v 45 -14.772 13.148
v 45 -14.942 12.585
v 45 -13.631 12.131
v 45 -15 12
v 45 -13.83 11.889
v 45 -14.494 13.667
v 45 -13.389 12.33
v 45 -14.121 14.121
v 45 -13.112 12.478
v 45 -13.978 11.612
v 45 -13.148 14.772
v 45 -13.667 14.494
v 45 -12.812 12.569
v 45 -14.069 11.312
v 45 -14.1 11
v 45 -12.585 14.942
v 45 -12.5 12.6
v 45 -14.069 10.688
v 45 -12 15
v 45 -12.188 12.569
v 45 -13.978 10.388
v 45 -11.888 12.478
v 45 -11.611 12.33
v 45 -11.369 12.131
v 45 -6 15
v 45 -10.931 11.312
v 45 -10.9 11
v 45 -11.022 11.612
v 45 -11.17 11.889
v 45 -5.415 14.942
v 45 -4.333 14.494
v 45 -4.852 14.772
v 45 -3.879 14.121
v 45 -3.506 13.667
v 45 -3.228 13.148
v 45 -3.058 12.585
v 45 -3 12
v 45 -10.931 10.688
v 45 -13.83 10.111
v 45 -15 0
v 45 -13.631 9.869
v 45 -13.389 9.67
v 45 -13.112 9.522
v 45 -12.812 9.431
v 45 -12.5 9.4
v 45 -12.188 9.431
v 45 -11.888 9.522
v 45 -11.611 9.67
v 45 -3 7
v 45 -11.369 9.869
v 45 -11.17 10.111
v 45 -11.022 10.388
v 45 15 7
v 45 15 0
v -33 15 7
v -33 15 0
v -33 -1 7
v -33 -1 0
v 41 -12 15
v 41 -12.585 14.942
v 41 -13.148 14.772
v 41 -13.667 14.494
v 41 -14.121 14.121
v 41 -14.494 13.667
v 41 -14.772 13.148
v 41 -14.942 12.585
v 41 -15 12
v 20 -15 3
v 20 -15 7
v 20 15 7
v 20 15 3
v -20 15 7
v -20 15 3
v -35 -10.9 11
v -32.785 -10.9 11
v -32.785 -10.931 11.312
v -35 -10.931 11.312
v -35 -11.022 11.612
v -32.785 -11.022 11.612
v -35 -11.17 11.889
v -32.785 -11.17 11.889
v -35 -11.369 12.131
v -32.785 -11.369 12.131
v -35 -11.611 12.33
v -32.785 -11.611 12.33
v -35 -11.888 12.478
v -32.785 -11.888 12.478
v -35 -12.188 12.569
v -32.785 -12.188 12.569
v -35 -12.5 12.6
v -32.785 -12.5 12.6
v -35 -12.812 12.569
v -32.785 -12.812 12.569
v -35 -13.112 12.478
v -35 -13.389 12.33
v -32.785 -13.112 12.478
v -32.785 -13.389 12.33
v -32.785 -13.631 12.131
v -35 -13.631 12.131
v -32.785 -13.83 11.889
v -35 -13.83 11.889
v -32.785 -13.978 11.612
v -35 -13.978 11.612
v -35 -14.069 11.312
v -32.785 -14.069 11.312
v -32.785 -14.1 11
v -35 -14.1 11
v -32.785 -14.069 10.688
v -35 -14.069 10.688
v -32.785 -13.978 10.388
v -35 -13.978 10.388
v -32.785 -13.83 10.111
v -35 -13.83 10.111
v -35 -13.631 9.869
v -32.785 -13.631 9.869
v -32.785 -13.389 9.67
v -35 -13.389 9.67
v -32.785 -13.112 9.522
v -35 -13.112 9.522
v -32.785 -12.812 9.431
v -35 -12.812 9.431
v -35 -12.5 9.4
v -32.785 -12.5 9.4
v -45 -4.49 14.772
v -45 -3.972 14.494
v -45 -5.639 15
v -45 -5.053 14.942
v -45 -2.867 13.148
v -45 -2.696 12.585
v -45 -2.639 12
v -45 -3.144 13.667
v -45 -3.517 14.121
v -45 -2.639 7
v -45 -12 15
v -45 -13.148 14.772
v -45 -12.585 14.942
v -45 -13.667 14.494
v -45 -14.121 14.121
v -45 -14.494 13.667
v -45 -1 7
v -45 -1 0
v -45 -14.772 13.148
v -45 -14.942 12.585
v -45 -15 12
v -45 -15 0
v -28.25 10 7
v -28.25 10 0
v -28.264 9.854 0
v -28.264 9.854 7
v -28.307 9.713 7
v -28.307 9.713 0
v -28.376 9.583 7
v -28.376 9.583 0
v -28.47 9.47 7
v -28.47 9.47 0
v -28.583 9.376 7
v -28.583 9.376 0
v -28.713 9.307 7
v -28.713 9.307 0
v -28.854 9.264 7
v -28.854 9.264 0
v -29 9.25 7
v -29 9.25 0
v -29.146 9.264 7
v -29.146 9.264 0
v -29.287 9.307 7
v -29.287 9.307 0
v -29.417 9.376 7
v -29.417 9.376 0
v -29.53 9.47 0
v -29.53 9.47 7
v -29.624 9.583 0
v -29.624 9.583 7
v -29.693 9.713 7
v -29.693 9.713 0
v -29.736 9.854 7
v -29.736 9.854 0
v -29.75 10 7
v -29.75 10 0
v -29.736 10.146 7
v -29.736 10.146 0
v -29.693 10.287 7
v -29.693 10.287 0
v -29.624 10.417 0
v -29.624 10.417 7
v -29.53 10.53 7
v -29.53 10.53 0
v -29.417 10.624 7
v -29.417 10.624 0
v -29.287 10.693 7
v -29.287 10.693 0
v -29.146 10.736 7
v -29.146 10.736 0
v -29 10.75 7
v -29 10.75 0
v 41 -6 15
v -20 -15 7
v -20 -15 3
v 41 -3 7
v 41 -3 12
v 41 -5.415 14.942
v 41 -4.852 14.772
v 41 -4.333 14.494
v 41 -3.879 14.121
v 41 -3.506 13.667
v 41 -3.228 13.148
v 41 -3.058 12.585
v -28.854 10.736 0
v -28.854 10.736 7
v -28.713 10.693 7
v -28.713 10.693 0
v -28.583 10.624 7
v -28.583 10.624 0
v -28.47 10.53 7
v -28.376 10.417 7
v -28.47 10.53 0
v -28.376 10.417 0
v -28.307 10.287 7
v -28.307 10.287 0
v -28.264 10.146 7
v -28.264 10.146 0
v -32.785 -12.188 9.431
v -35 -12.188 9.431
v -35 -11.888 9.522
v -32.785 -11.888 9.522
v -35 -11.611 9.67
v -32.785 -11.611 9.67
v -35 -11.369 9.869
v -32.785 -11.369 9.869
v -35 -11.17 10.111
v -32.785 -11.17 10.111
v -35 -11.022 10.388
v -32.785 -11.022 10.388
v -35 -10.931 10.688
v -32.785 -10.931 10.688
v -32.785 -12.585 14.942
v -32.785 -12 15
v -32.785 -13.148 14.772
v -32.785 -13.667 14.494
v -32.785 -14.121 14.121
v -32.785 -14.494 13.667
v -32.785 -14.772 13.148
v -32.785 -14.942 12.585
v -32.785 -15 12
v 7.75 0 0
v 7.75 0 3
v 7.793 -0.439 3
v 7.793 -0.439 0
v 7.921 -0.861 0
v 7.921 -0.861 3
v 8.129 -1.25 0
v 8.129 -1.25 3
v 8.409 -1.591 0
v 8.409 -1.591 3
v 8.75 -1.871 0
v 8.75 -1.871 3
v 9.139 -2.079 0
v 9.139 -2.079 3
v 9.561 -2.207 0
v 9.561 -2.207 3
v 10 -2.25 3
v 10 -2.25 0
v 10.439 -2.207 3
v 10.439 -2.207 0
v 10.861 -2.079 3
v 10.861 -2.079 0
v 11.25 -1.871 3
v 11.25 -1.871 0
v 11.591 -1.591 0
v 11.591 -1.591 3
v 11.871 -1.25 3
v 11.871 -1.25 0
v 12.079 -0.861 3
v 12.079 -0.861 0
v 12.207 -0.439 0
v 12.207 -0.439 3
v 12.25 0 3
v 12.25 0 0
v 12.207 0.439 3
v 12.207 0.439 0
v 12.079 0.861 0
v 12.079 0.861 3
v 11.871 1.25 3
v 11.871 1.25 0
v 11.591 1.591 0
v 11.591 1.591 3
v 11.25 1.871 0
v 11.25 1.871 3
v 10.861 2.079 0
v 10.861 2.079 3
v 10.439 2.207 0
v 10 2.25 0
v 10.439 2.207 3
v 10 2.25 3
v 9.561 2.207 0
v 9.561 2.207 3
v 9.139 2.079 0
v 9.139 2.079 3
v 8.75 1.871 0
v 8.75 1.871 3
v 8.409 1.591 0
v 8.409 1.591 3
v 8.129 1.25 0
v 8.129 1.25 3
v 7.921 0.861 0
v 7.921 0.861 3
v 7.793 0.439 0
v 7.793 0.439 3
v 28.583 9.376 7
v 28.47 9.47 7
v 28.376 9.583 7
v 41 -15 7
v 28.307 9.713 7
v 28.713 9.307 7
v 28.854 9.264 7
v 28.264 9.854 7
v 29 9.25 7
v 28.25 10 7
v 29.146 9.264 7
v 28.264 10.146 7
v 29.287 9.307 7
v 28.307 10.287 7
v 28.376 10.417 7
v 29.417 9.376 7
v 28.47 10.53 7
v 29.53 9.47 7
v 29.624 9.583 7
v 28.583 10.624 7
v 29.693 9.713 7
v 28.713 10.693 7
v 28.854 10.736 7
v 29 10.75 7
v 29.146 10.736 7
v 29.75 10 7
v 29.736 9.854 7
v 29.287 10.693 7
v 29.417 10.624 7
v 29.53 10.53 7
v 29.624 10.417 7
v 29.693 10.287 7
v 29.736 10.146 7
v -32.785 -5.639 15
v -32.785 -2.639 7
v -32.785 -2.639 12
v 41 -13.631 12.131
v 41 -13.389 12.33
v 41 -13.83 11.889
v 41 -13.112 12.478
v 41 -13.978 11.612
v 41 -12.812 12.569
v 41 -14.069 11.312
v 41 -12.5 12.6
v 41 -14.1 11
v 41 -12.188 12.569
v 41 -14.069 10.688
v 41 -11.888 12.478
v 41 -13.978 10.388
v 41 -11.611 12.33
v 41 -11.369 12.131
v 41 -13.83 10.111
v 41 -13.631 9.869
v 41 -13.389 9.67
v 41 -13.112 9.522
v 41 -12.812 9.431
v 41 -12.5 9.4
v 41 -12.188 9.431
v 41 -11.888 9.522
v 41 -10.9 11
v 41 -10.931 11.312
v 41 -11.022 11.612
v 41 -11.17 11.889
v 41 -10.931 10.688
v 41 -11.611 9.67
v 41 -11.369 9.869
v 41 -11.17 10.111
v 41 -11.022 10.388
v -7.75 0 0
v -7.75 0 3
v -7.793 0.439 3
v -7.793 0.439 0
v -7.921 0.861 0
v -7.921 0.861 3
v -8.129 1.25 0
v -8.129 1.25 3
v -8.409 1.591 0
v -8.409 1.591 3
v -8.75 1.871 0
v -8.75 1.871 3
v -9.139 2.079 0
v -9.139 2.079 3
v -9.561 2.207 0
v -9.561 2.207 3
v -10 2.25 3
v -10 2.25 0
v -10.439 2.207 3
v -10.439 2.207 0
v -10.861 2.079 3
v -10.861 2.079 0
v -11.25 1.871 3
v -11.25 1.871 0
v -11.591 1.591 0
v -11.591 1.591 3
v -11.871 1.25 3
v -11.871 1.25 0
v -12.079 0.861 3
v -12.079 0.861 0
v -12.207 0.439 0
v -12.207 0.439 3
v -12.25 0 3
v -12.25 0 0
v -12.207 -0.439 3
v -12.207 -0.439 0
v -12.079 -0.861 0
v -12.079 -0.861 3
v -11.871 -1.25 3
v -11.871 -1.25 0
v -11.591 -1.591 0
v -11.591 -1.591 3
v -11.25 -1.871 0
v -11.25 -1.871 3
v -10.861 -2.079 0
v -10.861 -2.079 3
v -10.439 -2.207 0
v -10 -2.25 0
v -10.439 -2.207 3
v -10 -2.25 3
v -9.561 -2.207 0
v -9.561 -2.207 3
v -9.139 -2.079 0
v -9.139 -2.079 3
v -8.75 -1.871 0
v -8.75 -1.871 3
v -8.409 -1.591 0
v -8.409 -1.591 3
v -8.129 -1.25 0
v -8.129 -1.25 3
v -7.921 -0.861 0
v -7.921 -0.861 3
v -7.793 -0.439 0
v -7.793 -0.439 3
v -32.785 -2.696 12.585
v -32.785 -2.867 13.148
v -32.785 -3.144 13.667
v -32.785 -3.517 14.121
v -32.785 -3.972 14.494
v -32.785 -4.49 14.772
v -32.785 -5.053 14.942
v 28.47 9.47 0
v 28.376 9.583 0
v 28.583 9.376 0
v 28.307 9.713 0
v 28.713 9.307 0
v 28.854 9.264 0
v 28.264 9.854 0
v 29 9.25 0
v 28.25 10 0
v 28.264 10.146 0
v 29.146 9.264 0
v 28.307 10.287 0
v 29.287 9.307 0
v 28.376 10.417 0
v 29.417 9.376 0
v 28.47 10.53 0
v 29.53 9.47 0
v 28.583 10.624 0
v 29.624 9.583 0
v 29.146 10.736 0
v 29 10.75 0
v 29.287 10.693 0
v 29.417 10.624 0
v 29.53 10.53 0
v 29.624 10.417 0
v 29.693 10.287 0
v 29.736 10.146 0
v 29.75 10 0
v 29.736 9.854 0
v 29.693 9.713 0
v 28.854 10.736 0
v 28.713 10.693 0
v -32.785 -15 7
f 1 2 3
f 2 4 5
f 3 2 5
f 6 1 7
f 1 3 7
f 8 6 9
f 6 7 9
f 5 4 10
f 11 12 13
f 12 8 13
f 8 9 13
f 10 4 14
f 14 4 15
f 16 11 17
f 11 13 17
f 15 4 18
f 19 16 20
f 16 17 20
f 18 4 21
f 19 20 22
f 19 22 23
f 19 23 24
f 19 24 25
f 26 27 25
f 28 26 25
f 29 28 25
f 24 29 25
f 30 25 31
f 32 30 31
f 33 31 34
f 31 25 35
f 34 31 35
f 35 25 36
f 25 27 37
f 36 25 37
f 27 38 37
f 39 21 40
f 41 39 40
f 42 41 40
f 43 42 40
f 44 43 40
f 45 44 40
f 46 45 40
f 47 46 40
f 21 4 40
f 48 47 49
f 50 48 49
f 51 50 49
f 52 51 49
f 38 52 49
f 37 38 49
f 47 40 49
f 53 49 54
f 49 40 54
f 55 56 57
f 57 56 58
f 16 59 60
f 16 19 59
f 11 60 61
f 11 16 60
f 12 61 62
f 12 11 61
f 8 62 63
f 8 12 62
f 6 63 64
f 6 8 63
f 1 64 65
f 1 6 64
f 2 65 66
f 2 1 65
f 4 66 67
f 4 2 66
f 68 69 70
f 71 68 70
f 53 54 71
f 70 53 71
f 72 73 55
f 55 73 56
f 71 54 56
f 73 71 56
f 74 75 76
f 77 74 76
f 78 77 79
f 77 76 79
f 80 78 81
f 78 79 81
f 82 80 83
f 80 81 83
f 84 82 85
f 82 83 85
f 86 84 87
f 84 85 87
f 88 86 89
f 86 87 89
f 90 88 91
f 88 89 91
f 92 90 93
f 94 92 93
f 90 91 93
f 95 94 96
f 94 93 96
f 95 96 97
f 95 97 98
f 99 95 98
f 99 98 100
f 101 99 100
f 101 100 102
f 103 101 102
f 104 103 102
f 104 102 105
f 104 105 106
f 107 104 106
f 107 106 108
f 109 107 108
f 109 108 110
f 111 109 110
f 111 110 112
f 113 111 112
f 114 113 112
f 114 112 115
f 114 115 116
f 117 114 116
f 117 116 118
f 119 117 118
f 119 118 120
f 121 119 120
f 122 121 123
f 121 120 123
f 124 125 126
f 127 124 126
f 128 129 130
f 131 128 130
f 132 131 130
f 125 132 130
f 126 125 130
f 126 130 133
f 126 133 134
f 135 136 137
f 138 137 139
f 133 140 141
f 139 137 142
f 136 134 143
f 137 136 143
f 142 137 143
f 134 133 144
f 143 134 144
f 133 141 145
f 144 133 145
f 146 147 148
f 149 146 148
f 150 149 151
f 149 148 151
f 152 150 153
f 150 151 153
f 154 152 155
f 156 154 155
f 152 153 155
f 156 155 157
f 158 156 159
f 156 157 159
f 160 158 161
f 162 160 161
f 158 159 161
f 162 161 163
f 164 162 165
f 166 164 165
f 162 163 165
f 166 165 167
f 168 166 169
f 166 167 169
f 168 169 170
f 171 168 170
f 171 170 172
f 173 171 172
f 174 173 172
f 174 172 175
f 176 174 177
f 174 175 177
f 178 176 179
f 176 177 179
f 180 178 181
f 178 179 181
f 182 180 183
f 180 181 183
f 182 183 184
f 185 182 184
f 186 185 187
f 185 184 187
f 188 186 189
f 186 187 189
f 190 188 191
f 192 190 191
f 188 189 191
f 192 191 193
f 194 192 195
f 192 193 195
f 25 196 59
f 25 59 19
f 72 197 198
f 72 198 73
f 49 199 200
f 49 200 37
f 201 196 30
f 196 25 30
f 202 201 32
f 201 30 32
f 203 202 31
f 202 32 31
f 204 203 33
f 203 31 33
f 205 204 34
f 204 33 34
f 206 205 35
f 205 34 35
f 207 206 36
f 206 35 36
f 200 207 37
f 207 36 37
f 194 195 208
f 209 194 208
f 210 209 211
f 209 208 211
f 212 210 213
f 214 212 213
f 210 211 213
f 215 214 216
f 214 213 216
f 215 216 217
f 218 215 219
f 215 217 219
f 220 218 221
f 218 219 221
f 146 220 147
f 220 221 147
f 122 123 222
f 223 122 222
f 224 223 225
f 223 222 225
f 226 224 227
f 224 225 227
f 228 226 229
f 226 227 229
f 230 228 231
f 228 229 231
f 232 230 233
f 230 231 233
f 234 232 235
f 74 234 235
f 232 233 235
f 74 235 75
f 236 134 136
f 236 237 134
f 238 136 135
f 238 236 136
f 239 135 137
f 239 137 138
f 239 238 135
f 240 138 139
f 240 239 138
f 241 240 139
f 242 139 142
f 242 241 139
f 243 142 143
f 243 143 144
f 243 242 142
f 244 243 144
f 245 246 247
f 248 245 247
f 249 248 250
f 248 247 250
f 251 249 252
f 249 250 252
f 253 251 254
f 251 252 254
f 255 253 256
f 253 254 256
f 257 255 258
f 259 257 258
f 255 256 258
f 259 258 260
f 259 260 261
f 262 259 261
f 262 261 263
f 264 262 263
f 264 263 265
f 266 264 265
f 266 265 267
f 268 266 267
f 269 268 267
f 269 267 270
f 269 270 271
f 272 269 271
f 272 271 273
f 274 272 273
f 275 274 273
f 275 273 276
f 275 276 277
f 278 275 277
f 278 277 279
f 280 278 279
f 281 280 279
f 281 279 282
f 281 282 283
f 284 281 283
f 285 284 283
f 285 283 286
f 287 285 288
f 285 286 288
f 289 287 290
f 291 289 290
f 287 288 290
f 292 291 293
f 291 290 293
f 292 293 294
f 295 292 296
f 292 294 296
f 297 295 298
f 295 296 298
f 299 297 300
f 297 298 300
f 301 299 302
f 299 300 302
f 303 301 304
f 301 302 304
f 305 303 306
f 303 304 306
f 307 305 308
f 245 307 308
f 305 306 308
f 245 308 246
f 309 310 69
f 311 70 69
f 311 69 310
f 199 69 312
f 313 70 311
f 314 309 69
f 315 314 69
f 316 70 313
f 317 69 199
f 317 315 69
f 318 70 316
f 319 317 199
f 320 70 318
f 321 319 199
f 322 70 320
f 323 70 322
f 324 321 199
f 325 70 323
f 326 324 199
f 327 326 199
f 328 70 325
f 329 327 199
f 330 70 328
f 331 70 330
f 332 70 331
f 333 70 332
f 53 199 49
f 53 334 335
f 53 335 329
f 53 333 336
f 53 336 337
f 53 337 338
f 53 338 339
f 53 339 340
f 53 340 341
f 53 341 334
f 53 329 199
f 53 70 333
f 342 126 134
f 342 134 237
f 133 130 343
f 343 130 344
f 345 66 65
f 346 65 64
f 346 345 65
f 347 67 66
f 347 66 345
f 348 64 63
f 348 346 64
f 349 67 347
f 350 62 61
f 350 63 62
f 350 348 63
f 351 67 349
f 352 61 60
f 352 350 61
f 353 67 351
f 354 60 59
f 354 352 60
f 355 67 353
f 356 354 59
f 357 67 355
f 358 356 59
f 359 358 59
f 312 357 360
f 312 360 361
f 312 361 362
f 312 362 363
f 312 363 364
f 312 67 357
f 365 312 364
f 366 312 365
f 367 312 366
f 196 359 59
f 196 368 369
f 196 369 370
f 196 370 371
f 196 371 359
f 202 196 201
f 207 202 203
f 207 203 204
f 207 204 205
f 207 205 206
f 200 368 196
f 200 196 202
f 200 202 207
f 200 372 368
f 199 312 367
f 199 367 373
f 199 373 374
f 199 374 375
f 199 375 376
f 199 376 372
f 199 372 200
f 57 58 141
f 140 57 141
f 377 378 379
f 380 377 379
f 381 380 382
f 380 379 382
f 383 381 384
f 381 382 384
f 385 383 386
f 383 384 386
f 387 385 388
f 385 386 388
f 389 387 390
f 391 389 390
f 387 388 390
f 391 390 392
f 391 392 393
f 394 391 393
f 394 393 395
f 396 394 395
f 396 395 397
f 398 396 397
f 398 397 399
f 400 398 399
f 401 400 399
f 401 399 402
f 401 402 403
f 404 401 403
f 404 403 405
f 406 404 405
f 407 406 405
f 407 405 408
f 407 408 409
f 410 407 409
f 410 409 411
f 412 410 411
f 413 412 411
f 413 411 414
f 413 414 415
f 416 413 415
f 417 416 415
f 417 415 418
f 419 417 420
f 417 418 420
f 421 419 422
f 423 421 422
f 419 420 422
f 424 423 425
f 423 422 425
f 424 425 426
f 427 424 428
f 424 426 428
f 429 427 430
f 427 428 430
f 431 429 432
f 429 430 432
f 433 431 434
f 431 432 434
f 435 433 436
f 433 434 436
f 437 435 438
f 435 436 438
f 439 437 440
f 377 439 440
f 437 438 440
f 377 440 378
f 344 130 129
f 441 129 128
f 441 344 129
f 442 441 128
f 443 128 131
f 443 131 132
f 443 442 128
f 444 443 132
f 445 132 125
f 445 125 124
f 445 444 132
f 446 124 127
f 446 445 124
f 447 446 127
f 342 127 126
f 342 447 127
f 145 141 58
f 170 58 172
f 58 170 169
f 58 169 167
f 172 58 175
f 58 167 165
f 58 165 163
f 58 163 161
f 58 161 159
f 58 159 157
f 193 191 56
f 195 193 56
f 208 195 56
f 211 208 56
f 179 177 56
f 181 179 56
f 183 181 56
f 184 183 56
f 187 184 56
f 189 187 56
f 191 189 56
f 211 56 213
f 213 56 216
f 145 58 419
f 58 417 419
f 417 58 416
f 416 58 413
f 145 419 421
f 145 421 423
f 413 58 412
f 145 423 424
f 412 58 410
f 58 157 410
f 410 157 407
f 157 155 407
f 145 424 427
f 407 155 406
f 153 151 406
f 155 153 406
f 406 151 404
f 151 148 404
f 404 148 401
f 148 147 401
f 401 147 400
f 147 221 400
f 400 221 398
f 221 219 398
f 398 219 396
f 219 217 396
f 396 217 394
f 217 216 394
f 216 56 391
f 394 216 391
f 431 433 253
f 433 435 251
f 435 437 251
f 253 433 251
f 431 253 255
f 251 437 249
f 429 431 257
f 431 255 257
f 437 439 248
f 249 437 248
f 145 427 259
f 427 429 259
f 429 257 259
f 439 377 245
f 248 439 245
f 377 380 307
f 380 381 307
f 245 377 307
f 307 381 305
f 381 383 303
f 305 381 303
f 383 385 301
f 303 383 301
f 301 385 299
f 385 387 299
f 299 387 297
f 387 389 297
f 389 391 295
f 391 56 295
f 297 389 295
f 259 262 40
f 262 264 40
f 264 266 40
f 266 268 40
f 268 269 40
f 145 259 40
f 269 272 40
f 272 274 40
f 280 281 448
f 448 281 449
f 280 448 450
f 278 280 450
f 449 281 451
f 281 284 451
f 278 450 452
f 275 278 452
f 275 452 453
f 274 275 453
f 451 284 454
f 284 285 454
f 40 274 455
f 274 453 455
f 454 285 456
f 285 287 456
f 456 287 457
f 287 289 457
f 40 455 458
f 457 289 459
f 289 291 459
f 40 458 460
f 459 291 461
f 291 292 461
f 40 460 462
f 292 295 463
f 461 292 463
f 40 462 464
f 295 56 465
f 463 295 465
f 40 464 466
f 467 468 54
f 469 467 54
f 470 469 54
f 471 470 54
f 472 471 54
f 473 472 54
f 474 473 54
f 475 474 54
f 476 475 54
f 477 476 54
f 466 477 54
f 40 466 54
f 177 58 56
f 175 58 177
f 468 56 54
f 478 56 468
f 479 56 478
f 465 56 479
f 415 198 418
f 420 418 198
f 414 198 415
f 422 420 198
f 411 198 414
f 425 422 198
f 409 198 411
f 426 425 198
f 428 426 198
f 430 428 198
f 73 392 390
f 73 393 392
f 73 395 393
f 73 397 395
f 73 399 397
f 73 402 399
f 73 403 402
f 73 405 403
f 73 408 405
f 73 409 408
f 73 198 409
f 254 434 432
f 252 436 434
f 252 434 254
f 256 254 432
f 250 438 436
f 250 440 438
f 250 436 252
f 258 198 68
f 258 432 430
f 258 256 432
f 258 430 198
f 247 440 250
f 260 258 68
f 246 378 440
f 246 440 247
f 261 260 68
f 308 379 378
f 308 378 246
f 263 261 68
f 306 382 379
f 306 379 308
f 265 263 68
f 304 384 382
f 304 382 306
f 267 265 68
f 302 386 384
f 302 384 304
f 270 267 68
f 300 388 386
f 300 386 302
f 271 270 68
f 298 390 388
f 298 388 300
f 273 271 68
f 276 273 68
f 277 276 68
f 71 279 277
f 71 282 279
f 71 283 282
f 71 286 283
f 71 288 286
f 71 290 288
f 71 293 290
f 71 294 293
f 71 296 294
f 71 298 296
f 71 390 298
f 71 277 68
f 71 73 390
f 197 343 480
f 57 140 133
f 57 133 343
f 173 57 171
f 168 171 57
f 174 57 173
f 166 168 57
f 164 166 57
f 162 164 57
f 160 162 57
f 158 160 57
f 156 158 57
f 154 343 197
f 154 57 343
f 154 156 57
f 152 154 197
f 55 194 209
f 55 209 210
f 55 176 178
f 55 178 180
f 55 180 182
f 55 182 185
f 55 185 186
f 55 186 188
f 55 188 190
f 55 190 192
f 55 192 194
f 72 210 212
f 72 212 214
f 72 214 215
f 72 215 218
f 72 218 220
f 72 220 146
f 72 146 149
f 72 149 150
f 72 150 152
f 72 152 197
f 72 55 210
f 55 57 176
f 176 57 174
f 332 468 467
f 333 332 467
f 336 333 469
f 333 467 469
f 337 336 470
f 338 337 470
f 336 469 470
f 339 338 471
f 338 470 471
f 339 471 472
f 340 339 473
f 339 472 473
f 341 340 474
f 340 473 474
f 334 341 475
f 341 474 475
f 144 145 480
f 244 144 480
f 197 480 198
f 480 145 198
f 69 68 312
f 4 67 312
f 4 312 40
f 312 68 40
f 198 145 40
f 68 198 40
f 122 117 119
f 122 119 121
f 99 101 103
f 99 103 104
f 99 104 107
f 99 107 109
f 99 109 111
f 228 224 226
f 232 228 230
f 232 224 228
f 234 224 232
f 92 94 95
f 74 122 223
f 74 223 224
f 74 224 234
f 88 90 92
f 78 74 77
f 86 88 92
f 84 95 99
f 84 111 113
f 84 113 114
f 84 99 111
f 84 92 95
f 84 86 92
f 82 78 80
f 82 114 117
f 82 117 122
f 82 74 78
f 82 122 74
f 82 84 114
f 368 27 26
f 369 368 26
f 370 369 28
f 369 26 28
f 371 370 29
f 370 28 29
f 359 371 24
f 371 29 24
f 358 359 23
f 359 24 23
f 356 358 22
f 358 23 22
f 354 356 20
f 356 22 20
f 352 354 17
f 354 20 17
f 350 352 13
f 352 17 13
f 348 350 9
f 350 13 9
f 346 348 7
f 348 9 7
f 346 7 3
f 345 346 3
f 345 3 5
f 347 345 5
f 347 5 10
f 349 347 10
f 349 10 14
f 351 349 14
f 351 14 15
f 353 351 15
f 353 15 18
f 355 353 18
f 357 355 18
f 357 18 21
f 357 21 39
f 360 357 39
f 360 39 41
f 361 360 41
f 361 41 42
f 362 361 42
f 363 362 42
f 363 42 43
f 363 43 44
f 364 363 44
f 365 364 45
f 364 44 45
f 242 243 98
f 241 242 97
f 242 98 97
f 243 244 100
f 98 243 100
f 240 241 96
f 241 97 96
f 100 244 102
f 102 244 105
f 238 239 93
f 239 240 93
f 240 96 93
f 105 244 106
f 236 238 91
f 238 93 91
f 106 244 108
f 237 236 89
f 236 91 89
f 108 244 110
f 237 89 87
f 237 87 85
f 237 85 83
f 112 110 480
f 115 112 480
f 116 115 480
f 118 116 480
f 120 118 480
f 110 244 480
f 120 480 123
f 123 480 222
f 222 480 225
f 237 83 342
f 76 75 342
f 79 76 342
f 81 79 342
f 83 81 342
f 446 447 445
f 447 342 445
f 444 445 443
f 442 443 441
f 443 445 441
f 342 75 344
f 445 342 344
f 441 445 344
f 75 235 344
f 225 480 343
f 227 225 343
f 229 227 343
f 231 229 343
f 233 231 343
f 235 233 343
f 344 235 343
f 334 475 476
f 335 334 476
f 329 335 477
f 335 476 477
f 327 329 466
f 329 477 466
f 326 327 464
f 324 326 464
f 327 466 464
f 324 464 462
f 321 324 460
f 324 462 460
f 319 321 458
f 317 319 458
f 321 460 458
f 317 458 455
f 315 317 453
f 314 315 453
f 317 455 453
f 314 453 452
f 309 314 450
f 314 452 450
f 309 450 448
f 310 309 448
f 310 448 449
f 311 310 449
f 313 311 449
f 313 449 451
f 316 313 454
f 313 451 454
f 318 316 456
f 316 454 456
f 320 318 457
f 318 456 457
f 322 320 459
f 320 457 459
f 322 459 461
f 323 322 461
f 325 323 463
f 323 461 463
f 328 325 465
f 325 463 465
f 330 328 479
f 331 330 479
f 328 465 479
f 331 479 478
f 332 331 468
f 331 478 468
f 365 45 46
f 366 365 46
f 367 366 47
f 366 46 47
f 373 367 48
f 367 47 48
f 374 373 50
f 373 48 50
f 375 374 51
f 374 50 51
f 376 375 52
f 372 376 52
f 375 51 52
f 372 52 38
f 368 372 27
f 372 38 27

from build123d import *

# Parameters (mm, degrees)
F1_DEPTH  = 7
F2_W      = 4
F2_H      = 12
F3_DEPTH  = 8
F4_W      = 12.2146774828
F4_H      = 1.6385169476
F5_DEPTH  = 8
F7_DEPTH  = 80
F8_R      = 2.25
F9_DEPTH  = 25
F10_W     = 40
F10_H     = 30
F10_R     = 2.25
F11_DEPTH = 4
F12_R     = 3


with BuildPart() as f1:
    # F0 (on Top) → F1 (new body)
    with BuildSketch(Plane.XY):
        Polygon((-29, 15), (-33, 15), (-33, -1), (-45, -1), (-45, -15), (45, -15), (45, 15), (29, 15), align=None)
        with BuildLine():
            ThreePointArc((-28.25, 10), (-29.5303300859, 9.4696699141), (-29, 10.75))
            ThreePointArc((-29, 10.75), (-28.4696699141, 10.5303300859), (-28.25, 10))
        make_face(mode=Mode.SUBTRACT)
        with BuildLine():
            ThreePointArc((29.75, 10), (28.4696699141, 9.4696699141), (29, 10.75))
            ThreePointArc((29, 10.75), (29.5303300859, 10.5303300859), (29.75, 10))
        make_face(mode=Mode.SUBTRACT)
    extrude(amount=F1_DEPTH)

    # F2 (on face) → F3 (join)
    with BuildSketch(Plane.XY.offset(7)):
        Polygon((-33, -1), (-45, -1), (-45, -15), (-32.7853225172, -15), (-32.7853225172, -1), align=None)
        with Locations((43, -9)):
            Rectangle(F2_W, F2_H)
    extrude(amount=F3_DEPTH)

    # F4 (on face) → F5 (cut)
    with BuildSketch(Plane.XY.offset(15)):
        with Locations((-38.8926612586, -1.8192584738)):
            Rectangle(F4_W, F4_H)
    extrude(amount=-F5_DEPTH, mode=Mode.SUBTRACT)

    # F6 (on face) → F7 (cut)
    with BuildSketch(Plane.YZ.offset(45)):
        with BuildLine():
            ThreePointArc((-12.5, 9.4), (-11.3686291501, 9.8686291501), (-10.9, 11))
            ThreePointArc((-10.9, 11), (-13.6313708499, 12.1313708499), (-12.5, 9.4))
        make_face()
    extrude(amount=-F7_DEPTH, mode=Mode.SUBTRACT)

    # F8 (on face) → F9 (cut)
    with BuildSketch(Plane.XY.offset(7)):
        with Locations((-10, 0)):
            Circle(F8_R)
        with BuildLine():
            ThreePointArc((12.25, 0), (10, 2.25), (7.75, 0))
            ThreePointArc((7.75, 0), (10, -2.25), (12.25, 0))
        make_face()
    extrude(amount=-F9_DEPTH, mode=Mode.SUBTRACT)

    # F10 (on face) → F11 (cut)
    with BuildSketch(Plane.XY.offset(7)):
        Rectangle(F10_W, F10_H)
        with Locations((-10, 0)):
            Circle(F10_R, mode=Mode.SUBTRACT)
        with Locations((10, 0)):
            Circle(F10_R, mode=Mode.SUBTRACT)
    extrude(amount=-F11_DEPTH, mode=Mode.SUBTRACT)

    # F12
    f12_edges = [f1.edges().sort_by_distance(p)[0] for p in [
        (-38.892661, -15, 15),
        (43, -15, 15),
        (-38.892661, -2.638517, 15),
        (43, -3, 15),
    ]]
    fillet(f12_edges, radius=F12_R)


solid = f1.part
